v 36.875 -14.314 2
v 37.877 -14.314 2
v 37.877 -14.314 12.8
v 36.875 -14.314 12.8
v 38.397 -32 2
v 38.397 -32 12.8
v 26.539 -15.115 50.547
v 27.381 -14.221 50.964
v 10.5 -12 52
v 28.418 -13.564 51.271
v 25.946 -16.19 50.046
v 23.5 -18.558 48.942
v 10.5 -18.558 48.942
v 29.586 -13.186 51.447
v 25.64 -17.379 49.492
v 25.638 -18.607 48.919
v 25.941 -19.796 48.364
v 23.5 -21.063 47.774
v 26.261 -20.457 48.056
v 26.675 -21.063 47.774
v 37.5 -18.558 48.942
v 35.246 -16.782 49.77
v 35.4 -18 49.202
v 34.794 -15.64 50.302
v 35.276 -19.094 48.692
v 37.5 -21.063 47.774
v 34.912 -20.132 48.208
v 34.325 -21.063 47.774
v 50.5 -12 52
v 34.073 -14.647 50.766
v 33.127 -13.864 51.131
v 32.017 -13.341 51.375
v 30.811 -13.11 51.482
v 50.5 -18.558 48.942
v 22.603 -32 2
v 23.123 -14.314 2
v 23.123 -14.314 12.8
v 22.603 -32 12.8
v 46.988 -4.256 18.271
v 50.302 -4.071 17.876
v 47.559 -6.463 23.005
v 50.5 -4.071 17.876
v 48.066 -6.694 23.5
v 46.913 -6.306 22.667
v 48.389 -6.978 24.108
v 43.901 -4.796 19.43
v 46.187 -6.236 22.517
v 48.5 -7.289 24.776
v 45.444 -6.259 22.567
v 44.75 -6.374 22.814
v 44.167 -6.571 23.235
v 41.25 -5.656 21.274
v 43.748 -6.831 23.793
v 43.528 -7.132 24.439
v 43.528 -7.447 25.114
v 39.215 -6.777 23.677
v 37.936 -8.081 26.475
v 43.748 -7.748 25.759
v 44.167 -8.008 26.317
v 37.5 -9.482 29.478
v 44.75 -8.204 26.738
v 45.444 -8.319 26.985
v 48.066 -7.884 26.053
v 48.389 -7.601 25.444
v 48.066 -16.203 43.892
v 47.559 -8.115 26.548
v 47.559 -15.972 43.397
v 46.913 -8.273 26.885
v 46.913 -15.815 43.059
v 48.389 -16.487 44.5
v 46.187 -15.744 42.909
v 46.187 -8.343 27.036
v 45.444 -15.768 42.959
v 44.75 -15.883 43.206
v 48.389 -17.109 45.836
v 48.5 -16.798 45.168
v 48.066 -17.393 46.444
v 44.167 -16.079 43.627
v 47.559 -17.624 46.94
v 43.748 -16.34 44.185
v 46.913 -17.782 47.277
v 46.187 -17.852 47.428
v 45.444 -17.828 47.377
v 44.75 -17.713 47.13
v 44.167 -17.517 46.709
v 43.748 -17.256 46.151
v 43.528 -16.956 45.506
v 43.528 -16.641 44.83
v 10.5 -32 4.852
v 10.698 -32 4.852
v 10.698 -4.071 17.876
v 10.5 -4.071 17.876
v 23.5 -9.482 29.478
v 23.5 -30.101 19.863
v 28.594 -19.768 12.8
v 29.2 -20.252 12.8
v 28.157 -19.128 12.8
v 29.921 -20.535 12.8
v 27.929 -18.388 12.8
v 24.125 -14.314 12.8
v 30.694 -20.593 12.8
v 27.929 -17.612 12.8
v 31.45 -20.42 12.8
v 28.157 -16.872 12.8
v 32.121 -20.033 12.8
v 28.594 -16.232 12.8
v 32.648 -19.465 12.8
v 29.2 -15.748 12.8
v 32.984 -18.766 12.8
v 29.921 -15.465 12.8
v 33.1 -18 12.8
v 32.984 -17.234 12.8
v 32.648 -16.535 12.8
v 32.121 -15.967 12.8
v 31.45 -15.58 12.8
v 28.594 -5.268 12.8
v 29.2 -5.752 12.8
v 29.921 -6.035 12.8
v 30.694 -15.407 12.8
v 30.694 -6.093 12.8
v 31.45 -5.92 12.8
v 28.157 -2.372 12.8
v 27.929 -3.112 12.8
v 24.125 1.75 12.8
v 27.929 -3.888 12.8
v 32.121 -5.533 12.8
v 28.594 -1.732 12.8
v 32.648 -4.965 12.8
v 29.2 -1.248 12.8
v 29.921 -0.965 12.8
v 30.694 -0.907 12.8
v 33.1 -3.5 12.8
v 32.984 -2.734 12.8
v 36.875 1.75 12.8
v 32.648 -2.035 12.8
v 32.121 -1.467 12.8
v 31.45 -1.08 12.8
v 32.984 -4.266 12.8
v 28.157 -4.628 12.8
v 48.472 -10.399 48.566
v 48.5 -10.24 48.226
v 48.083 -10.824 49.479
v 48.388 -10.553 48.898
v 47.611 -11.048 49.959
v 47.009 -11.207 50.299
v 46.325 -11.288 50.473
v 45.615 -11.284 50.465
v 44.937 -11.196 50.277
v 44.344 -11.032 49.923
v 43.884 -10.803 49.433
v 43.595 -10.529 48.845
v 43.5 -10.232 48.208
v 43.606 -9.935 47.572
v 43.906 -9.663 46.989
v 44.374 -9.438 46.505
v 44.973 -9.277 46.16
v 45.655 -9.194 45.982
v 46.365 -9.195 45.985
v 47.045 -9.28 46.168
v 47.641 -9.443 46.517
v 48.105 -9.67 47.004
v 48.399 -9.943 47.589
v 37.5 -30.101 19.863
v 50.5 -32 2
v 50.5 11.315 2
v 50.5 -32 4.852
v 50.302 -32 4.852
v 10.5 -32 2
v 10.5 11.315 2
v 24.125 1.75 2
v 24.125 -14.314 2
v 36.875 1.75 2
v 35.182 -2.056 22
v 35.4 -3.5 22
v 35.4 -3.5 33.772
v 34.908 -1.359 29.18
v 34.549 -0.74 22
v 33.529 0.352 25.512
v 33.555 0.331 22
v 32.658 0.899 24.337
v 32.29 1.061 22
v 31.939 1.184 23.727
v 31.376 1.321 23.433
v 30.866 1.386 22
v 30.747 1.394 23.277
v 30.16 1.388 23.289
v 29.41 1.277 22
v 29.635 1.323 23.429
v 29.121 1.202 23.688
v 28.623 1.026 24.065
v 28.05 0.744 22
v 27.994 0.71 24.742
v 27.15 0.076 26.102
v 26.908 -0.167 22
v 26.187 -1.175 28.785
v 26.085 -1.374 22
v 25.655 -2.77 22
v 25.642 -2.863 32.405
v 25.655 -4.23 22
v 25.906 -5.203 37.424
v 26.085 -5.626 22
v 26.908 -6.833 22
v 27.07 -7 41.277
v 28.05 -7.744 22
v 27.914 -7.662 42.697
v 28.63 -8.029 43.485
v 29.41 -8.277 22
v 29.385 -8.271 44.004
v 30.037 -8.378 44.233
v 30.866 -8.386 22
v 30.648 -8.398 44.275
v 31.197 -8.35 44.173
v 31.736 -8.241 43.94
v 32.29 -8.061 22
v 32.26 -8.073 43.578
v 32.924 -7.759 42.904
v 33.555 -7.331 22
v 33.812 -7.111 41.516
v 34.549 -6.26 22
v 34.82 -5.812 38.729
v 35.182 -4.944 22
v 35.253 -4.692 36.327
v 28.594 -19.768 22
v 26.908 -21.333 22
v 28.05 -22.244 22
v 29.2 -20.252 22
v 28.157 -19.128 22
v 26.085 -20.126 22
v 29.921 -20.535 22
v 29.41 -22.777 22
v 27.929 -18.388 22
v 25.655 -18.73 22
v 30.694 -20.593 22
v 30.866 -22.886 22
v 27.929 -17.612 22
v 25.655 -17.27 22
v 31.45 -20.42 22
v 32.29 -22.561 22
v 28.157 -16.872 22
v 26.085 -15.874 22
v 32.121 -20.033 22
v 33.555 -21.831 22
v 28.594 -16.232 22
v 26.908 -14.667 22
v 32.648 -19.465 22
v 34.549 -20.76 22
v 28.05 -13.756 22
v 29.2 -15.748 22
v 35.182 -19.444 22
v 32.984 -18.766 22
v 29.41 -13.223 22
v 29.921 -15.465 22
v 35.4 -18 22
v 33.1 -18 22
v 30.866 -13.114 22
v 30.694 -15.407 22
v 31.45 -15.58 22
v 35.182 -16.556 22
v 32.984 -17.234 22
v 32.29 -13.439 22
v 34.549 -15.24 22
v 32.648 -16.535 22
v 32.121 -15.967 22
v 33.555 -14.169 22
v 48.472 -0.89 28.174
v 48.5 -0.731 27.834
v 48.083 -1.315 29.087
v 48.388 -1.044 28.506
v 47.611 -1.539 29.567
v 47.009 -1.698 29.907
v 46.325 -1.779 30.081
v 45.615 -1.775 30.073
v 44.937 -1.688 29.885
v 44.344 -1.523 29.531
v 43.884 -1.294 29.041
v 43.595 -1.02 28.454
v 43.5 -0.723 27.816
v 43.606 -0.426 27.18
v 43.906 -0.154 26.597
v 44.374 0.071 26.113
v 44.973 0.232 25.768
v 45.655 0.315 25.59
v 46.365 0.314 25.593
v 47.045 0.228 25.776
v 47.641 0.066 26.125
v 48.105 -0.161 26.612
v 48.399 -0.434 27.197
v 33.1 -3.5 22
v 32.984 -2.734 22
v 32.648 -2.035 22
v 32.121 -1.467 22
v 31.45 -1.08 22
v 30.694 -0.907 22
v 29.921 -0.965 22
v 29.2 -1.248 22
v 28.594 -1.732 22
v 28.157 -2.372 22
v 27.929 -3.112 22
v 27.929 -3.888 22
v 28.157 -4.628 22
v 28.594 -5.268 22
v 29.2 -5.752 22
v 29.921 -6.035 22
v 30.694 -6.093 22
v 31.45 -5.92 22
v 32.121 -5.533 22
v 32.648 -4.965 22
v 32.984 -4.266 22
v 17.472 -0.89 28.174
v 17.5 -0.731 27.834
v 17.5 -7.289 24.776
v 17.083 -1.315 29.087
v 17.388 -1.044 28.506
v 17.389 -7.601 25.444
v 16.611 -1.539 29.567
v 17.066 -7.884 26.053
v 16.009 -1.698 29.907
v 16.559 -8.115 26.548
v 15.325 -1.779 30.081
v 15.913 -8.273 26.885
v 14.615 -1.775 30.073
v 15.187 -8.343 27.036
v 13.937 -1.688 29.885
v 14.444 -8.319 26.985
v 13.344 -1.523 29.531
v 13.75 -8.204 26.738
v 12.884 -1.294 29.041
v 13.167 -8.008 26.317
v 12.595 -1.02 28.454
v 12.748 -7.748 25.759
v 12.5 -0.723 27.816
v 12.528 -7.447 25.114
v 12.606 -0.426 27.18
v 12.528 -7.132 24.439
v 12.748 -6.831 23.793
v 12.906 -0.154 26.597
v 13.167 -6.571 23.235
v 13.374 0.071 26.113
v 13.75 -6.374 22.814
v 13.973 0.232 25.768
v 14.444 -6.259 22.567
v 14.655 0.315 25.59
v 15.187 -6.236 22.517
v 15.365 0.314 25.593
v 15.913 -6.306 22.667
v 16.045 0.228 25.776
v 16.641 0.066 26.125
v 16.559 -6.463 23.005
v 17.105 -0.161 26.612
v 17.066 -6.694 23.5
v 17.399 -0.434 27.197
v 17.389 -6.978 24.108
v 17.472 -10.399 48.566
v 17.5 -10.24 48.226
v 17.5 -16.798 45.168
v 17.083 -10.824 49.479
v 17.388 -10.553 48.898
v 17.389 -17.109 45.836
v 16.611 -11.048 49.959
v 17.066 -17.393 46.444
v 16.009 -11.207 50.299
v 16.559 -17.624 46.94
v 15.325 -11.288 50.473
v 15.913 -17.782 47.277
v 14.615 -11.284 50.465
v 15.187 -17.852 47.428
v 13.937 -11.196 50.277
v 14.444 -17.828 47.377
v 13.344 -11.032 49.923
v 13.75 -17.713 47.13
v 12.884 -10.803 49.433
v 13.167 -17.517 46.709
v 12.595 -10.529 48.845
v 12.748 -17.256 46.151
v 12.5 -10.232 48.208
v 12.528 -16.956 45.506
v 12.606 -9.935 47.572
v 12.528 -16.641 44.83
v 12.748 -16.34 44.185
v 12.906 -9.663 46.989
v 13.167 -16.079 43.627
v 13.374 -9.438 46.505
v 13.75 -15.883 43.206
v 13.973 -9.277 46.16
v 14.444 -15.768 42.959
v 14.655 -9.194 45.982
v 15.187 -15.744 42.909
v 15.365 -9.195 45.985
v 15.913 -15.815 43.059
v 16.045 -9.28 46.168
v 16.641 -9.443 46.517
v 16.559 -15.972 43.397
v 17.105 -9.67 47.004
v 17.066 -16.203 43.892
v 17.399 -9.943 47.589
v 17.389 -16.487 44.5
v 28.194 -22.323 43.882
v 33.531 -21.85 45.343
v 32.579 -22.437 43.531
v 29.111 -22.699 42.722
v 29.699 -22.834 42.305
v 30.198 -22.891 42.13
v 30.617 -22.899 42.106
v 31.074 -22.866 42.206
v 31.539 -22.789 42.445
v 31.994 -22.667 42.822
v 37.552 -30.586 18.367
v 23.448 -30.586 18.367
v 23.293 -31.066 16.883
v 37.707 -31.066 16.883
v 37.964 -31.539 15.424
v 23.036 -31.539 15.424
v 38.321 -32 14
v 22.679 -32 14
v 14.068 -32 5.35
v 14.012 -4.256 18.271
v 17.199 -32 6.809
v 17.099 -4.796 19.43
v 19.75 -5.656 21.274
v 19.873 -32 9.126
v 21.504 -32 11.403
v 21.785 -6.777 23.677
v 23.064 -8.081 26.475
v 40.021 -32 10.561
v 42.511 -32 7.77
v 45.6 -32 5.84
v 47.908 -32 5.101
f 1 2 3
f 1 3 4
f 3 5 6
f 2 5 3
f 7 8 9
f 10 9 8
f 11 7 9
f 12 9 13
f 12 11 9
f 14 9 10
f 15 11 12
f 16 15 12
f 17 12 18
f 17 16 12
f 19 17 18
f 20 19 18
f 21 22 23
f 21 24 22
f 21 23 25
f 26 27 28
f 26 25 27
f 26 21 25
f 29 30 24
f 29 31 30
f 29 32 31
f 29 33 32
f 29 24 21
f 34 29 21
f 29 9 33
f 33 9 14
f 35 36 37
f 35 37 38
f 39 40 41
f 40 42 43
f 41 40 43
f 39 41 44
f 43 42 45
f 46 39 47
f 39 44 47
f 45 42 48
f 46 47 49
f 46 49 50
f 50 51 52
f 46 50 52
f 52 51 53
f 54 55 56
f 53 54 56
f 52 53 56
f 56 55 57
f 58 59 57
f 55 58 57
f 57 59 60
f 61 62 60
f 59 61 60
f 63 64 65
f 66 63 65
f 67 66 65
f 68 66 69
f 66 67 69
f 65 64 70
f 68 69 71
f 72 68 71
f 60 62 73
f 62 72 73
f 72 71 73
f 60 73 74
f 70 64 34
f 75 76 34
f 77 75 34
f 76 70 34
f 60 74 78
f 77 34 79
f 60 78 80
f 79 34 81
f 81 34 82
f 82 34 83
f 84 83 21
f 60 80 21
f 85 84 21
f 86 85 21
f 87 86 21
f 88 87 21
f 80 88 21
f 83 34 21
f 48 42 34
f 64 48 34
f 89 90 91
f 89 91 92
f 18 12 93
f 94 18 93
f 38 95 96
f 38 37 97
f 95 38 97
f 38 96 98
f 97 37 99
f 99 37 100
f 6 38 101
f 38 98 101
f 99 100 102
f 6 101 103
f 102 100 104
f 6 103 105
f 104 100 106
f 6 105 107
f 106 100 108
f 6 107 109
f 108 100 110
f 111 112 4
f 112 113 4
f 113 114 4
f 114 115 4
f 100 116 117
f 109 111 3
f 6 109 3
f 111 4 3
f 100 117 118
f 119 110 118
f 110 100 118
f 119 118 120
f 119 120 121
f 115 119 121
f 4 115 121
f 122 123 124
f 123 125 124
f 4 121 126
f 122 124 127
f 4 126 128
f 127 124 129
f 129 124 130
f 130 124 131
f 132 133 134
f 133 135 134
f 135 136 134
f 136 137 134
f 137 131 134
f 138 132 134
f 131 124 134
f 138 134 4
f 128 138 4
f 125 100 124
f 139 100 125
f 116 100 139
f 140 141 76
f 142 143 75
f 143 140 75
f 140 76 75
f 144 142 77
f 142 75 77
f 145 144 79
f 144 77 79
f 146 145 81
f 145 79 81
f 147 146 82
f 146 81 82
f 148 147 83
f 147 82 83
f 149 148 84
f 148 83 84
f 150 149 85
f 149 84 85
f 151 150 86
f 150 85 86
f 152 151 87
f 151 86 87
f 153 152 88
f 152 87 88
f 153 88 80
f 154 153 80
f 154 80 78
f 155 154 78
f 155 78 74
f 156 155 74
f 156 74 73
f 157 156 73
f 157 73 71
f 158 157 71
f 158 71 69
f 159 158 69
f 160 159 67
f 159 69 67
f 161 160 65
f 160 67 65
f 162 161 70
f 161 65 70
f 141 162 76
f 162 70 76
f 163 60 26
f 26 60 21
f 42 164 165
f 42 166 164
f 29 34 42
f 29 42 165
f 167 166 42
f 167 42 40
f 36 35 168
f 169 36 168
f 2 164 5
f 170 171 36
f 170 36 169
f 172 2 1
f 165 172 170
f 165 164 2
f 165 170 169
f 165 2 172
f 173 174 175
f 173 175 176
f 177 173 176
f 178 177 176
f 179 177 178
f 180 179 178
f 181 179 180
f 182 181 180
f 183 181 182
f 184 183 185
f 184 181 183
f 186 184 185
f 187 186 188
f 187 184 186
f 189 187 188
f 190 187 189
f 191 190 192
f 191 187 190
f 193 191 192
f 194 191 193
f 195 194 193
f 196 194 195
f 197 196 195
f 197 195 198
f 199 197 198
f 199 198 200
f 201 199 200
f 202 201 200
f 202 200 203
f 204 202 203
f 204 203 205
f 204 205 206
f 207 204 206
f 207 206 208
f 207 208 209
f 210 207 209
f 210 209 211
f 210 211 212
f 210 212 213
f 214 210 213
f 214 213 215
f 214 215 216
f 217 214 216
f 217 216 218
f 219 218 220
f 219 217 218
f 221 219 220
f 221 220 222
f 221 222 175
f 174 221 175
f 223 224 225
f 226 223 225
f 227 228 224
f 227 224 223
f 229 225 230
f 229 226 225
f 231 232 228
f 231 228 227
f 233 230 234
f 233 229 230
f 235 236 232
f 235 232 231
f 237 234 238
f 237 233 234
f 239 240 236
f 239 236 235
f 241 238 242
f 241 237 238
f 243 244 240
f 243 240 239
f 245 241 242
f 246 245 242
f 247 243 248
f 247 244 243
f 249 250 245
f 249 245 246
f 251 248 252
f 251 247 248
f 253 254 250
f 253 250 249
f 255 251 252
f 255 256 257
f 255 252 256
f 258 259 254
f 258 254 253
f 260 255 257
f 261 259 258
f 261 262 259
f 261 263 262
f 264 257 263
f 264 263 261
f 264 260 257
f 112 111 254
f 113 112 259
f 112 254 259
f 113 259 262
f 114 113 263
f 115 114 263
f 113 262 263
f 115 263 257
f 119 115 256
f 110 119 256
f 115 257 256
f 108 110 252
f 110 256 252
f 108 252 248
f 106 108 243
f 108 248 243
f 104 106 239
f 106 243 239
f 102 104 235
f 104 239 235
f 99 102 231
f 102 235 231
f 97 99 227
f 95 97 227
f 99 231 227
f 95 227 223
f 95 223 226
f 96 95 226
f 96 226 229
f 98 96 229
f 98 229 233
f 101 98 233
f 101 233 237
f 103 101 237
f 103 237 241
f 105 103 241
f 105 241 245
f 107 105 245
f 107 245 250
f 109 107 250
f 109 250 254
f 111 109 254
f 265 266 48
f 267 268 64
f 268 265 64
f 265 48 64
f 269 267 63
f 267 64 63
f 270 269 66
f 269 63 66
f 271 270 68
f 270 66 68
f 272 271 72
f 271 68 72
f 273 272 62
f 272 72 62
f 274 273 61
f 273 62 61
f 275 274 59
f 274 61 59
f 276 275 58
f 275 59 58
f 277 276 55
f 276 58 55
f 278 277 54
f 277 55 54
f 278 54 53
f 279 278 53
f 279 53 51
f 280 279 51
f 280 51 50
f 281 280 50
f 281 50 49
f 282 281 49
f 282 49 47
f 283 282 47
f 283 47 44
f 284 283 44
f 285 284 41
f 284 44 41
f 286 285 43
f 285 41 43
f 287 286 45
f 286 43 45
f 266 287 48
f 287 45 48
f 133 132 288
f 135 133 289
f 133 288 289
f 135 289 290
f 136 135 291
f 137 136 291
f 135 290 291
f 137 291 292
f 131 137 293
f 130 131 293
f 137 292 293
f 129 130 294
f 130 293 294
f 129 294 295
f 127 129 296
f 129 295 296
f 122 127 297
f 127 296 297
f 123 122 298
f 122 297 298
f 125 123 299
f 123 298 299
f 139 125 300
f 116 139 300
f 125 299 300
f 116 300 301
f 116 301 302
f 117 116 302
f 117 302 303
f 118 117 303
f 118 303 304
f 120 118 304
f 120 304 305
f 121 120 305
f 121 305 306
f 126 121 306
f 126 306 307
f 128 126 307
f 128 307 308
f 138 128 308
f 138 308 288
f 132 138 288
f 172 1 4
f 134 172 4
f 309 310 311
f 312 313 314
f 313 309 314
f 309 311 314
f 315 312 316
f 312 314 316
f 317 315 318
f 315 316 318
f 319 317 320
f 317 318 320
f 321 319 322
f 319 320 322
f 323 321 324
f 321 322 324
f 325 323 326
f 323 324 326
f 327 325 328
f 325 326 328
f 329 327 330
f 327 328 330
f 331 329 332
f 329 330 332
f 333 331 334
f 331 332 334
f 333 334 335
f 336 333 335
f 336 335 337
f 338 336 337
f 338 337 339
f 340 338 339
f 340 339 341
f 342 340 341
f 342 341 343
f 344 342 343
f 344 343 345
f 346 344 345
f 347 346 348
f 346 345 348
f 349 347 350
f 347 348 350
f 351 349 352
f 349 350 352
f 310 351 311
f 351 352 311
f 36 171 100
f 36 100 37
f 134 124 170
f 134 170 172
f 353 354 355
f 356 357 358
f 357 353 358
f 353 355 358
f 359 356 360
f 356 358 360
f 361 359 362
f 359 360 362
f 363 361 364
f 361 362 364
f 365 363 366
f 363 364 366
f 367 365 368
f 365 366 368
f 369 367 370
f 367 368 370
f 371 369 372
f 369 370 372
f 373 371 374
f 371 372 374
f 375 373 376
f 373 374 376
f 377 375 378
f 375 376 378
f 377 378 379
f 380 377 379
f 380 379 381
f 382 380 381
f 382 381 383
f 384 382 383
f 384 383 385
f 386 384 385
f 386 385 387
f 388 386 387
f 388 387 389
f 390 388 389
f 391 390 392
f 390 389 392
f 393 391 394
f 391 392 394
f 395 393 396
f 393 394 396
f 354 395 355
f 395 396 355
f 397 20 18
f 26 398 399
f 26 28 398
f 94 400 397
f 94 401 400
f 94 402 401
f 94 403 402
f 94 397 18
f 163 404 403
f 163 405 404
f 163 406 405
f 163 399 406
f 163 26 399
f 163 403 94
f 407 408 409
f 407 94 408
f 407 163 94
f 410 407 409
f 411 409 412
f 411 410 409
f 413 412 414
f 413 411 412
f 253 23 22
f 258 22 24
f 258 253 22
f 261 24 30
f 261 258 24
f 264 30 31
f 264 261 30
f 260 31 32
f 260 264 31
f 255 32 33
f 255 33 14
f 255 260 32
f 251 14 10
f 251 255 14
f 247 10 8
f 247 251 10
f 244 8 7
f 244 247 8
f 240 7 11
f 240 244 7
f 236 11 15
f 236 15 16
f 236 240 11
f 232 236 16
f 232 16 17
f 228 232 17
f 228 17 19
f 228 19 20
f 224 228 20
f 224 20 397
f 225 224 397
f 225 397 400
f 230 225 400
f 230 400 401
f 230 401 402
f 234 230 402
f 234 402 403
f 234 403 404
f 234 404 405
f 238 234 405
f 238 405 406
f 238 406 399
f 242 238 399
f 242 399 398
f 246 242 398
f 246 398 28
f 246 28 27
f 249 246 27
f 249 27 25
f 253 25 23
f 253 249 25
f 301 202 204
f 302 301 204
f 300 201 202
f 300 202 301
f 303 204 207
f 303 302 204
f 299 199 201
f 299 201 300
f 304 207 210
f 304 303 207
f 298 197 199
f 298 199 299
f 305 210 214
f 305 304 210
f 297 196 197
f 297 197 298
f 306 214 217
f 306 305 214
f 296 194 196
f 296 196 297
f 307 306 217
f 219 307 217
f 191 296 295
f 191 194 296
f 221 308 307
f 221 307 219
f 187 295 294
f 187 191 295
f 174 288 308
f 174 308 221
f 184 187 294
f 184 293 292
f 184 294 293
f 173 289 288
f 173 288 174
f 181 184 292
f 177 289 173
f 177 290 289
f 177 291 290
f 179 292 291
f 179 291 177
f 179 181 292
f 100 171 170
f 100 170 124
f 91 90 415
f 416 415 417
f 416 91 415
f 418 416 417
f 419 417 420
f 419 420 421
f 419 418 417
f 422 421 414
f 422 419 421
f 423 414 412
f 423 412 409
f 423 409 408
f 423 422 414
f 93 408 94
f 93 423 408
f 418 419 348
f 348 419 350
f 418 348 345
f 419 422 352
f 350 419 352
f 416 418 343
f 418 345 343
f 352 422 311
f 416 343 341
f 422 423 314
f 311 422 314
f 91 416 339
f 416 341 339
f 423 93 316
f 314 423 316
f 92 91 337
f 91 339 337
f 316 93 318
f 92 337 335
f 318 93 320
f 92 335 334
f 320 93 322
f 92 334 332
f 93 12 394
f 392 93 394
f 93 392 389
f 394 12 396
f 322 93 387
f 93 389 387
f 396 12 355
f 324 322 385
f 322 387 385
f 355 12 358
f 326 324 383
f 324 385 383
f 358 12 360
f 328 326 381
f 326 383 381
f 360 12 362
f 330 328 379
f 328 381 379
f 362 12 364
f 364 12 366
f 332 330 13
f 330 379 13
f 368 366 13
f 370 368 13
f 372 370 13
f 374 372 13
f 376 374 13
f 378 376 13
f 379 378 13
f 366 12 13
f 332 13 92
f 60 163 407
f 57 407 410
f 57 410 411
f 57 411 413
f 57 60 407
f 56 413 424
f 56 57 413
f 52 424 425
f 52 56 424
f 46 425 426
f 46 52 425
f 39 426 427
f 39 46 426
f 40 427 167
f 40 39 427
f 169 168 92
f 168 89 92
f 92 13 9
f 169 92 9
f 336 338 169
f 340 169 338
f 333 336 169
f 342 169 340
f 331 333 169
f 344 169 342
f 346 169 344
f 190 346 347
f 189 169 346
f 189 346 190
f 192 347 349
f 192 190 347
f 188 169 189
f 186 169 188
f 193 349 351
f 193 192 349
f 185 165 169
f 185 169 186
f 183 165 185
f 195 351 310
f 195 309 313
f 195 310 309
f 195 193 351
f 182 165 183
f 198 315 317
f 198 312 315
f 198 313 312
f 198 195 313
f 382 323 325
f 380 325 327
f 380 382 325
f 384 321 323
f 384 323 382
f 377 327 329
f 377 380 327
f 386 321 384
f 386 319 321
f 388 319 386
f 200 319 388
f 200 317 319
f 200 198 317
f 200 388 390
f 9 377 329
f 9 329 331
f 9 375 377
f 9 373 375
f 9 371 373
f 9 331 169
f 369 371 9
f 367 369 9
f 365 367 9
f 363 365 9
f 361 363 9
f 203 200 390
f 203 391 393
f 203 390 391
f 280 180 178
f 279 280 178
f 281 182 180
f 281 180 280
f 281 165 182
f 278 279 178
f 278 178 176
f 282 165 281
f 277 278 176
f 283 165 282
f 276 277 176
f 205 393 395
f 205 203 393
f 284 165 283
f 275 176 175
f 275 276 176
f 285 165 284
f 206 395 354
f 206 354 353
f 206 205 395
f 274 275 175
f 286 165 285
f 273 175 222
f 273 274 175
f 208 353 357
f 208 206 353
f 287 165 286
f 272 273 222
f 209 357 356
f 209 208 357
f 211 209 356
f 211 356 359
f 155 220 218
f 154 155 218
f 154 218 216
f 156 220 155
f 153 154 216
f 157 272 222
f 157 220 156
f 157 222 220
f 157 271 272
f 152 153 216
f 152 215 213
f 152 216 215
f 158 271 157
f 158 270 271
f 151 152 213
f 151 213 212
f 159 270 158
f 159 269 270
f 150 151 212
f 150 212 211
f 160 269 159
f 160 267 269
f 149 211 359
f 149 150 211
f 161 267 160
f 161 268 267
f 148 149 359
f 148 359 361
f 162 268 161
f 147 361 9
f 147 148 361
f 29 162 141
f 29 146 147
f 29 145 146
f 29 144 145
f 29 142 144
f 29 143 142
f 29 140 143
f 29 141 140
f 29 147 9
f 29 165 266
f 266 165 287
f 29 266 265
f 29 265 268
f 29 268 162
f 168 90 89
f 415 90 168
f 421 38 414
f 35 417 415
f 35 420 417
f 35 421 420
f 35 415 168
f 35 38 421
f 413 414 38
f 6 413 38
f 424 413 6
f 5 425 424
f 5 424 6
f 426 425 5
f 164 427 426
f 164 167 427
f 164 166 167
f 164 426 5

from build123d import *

# Parameters (mm, degrees)
PAD010_DEPTH    = 20
SKETCH018_W     = 12.75
SKETCH018_H     = 10.8
POCKET006_DEPTH = 33.75
POCKET007_DEPTH = 50
SKETCH017_R     = 4.9
POCKET008_DEPTH = 30.001
SKETCH020_R     = 2.6
POCKET009_DEPTH = 20.001
SKETCH021_R     = 2.5
POCKET010_DEPTH = 31.086657
POCKET011_DEPTH = 10.8


with BuildPart() as part:
    # Sketch016 → Pad010 (new body, symmetric)
    with BuildSketch(Plane.YZ):
        Polygon((23.315383, 0), (0, 50), (-9.063078, 45.773817), (-20, 12), (-20, 0), align=None)
    extrude(amount=PAD010_DEPTH, both=True)

    # Sketch018 → Pocket006 (cut)
    with BuildSketch(Plane.XZ.offset(20)):
        with Locations((0, 5.4)):
            Rectangle(SKETCH018_W, SKETCH018_H)
    extrude(amount=-POCKET006_DEPTH, mode=Mode.SUBTRACT)

    # Sketch019 → Pocket007 (cut)
    with BuildSketch(Plane(origin=(0, 13, 5), x_dir=(1, 0, 0), z_dir=(0, -0.906308, -0.422618))):
        with BuildLine():
            Line((-29.407349, 60.205246), (-7, 60.205246))
            Line((-7, 60.205246), (-7, 24.801724))
            ThreePointArc((-19.801724, 12), (-10.749538, 15.749538), (-7, 24.801724))
            Line((-19.801724, 12), (-29.407349, 12))
            Line((-29.407349, 12), (-29.407349, 60.205246))
        make_face()
        with BuildLine():
            Line((7, 60.205246), (29.407349, 60.205246))
            Line((29.407349, 60.205246), (29.407349, 12))
            Line((29.407349, 12), (19.801724, 12))
            ThreePointArc((7, 24.801724), (10.749538, 15.749538), (19.801724, 12))
            Line((7, 24.801724), (7, 60.205246))
        make_face()
    extrude(amount=POCKET007_DEPTH, mode=Mode.SUBTRACT)

    # Sketch017 → Pocket008 (cut, through all)
    with BuildSketch(Plane.XY.offset(20)):
        with Locations((0, -6)):
            Circle(SKETCH017_R)
        with Locations((0, 8.5)):
            Circle(SKETCH017_R)
    extrude(amount=POCKET008_DEPTH, mode=Mode.SUBTRACT)

    # Sketch020 → Pocket009 (cut, through all)
    with BuildSketch(Plane.XY.offset(20)):
        with Locations((0, -6)):
            Circle(SKETCH020_R)
        with Locations((0, 8.5)):
            Circle(SKETCH020_R)
    extrude(amount=-POCKET009_DEPTH, mode=Mode.SUBTRACT)

    # Sketch021 → Pocket010 (cut, through all)
    with BuildSketch(Plane(origin=(0, 10, 5), x_dir=(1, 0, 0), z_dir=(0, -0.906308, -0.422618))):
        with Locations((15.5, 18.346014)):
            Circle(SKETCH021_R)
        with Locations((-15.5, 18.346014)):
            Circle(SKETCH021_R)
        with Locations((15.5, 40.846014)):
            Circle(SKETCH021_R)
        with Locations((-15.5, 40.846014)):
            Circle(SKETCH021_R)
    extrude(amount=-POCKET010_DEPTH, mode=Mode.SUBTRACT)

    # Sketch022 → Pocket011 (cut)
    with BuildSketch(Plane.XY):
        Polygon((-7.9, -20.114331), (7.9, -20.114331), (7.377167, -2.314331), (-7.377167, -2.314331), align=None)
    extrude(amount=POCKET011_DEPTH, mode=Mode.SUBTRACT)


with BuildPart() as part_1:
    # Body009 placement: moved
    add(part.part.moved(Location((30.5, -12, 2))))


solid = part_1.part
